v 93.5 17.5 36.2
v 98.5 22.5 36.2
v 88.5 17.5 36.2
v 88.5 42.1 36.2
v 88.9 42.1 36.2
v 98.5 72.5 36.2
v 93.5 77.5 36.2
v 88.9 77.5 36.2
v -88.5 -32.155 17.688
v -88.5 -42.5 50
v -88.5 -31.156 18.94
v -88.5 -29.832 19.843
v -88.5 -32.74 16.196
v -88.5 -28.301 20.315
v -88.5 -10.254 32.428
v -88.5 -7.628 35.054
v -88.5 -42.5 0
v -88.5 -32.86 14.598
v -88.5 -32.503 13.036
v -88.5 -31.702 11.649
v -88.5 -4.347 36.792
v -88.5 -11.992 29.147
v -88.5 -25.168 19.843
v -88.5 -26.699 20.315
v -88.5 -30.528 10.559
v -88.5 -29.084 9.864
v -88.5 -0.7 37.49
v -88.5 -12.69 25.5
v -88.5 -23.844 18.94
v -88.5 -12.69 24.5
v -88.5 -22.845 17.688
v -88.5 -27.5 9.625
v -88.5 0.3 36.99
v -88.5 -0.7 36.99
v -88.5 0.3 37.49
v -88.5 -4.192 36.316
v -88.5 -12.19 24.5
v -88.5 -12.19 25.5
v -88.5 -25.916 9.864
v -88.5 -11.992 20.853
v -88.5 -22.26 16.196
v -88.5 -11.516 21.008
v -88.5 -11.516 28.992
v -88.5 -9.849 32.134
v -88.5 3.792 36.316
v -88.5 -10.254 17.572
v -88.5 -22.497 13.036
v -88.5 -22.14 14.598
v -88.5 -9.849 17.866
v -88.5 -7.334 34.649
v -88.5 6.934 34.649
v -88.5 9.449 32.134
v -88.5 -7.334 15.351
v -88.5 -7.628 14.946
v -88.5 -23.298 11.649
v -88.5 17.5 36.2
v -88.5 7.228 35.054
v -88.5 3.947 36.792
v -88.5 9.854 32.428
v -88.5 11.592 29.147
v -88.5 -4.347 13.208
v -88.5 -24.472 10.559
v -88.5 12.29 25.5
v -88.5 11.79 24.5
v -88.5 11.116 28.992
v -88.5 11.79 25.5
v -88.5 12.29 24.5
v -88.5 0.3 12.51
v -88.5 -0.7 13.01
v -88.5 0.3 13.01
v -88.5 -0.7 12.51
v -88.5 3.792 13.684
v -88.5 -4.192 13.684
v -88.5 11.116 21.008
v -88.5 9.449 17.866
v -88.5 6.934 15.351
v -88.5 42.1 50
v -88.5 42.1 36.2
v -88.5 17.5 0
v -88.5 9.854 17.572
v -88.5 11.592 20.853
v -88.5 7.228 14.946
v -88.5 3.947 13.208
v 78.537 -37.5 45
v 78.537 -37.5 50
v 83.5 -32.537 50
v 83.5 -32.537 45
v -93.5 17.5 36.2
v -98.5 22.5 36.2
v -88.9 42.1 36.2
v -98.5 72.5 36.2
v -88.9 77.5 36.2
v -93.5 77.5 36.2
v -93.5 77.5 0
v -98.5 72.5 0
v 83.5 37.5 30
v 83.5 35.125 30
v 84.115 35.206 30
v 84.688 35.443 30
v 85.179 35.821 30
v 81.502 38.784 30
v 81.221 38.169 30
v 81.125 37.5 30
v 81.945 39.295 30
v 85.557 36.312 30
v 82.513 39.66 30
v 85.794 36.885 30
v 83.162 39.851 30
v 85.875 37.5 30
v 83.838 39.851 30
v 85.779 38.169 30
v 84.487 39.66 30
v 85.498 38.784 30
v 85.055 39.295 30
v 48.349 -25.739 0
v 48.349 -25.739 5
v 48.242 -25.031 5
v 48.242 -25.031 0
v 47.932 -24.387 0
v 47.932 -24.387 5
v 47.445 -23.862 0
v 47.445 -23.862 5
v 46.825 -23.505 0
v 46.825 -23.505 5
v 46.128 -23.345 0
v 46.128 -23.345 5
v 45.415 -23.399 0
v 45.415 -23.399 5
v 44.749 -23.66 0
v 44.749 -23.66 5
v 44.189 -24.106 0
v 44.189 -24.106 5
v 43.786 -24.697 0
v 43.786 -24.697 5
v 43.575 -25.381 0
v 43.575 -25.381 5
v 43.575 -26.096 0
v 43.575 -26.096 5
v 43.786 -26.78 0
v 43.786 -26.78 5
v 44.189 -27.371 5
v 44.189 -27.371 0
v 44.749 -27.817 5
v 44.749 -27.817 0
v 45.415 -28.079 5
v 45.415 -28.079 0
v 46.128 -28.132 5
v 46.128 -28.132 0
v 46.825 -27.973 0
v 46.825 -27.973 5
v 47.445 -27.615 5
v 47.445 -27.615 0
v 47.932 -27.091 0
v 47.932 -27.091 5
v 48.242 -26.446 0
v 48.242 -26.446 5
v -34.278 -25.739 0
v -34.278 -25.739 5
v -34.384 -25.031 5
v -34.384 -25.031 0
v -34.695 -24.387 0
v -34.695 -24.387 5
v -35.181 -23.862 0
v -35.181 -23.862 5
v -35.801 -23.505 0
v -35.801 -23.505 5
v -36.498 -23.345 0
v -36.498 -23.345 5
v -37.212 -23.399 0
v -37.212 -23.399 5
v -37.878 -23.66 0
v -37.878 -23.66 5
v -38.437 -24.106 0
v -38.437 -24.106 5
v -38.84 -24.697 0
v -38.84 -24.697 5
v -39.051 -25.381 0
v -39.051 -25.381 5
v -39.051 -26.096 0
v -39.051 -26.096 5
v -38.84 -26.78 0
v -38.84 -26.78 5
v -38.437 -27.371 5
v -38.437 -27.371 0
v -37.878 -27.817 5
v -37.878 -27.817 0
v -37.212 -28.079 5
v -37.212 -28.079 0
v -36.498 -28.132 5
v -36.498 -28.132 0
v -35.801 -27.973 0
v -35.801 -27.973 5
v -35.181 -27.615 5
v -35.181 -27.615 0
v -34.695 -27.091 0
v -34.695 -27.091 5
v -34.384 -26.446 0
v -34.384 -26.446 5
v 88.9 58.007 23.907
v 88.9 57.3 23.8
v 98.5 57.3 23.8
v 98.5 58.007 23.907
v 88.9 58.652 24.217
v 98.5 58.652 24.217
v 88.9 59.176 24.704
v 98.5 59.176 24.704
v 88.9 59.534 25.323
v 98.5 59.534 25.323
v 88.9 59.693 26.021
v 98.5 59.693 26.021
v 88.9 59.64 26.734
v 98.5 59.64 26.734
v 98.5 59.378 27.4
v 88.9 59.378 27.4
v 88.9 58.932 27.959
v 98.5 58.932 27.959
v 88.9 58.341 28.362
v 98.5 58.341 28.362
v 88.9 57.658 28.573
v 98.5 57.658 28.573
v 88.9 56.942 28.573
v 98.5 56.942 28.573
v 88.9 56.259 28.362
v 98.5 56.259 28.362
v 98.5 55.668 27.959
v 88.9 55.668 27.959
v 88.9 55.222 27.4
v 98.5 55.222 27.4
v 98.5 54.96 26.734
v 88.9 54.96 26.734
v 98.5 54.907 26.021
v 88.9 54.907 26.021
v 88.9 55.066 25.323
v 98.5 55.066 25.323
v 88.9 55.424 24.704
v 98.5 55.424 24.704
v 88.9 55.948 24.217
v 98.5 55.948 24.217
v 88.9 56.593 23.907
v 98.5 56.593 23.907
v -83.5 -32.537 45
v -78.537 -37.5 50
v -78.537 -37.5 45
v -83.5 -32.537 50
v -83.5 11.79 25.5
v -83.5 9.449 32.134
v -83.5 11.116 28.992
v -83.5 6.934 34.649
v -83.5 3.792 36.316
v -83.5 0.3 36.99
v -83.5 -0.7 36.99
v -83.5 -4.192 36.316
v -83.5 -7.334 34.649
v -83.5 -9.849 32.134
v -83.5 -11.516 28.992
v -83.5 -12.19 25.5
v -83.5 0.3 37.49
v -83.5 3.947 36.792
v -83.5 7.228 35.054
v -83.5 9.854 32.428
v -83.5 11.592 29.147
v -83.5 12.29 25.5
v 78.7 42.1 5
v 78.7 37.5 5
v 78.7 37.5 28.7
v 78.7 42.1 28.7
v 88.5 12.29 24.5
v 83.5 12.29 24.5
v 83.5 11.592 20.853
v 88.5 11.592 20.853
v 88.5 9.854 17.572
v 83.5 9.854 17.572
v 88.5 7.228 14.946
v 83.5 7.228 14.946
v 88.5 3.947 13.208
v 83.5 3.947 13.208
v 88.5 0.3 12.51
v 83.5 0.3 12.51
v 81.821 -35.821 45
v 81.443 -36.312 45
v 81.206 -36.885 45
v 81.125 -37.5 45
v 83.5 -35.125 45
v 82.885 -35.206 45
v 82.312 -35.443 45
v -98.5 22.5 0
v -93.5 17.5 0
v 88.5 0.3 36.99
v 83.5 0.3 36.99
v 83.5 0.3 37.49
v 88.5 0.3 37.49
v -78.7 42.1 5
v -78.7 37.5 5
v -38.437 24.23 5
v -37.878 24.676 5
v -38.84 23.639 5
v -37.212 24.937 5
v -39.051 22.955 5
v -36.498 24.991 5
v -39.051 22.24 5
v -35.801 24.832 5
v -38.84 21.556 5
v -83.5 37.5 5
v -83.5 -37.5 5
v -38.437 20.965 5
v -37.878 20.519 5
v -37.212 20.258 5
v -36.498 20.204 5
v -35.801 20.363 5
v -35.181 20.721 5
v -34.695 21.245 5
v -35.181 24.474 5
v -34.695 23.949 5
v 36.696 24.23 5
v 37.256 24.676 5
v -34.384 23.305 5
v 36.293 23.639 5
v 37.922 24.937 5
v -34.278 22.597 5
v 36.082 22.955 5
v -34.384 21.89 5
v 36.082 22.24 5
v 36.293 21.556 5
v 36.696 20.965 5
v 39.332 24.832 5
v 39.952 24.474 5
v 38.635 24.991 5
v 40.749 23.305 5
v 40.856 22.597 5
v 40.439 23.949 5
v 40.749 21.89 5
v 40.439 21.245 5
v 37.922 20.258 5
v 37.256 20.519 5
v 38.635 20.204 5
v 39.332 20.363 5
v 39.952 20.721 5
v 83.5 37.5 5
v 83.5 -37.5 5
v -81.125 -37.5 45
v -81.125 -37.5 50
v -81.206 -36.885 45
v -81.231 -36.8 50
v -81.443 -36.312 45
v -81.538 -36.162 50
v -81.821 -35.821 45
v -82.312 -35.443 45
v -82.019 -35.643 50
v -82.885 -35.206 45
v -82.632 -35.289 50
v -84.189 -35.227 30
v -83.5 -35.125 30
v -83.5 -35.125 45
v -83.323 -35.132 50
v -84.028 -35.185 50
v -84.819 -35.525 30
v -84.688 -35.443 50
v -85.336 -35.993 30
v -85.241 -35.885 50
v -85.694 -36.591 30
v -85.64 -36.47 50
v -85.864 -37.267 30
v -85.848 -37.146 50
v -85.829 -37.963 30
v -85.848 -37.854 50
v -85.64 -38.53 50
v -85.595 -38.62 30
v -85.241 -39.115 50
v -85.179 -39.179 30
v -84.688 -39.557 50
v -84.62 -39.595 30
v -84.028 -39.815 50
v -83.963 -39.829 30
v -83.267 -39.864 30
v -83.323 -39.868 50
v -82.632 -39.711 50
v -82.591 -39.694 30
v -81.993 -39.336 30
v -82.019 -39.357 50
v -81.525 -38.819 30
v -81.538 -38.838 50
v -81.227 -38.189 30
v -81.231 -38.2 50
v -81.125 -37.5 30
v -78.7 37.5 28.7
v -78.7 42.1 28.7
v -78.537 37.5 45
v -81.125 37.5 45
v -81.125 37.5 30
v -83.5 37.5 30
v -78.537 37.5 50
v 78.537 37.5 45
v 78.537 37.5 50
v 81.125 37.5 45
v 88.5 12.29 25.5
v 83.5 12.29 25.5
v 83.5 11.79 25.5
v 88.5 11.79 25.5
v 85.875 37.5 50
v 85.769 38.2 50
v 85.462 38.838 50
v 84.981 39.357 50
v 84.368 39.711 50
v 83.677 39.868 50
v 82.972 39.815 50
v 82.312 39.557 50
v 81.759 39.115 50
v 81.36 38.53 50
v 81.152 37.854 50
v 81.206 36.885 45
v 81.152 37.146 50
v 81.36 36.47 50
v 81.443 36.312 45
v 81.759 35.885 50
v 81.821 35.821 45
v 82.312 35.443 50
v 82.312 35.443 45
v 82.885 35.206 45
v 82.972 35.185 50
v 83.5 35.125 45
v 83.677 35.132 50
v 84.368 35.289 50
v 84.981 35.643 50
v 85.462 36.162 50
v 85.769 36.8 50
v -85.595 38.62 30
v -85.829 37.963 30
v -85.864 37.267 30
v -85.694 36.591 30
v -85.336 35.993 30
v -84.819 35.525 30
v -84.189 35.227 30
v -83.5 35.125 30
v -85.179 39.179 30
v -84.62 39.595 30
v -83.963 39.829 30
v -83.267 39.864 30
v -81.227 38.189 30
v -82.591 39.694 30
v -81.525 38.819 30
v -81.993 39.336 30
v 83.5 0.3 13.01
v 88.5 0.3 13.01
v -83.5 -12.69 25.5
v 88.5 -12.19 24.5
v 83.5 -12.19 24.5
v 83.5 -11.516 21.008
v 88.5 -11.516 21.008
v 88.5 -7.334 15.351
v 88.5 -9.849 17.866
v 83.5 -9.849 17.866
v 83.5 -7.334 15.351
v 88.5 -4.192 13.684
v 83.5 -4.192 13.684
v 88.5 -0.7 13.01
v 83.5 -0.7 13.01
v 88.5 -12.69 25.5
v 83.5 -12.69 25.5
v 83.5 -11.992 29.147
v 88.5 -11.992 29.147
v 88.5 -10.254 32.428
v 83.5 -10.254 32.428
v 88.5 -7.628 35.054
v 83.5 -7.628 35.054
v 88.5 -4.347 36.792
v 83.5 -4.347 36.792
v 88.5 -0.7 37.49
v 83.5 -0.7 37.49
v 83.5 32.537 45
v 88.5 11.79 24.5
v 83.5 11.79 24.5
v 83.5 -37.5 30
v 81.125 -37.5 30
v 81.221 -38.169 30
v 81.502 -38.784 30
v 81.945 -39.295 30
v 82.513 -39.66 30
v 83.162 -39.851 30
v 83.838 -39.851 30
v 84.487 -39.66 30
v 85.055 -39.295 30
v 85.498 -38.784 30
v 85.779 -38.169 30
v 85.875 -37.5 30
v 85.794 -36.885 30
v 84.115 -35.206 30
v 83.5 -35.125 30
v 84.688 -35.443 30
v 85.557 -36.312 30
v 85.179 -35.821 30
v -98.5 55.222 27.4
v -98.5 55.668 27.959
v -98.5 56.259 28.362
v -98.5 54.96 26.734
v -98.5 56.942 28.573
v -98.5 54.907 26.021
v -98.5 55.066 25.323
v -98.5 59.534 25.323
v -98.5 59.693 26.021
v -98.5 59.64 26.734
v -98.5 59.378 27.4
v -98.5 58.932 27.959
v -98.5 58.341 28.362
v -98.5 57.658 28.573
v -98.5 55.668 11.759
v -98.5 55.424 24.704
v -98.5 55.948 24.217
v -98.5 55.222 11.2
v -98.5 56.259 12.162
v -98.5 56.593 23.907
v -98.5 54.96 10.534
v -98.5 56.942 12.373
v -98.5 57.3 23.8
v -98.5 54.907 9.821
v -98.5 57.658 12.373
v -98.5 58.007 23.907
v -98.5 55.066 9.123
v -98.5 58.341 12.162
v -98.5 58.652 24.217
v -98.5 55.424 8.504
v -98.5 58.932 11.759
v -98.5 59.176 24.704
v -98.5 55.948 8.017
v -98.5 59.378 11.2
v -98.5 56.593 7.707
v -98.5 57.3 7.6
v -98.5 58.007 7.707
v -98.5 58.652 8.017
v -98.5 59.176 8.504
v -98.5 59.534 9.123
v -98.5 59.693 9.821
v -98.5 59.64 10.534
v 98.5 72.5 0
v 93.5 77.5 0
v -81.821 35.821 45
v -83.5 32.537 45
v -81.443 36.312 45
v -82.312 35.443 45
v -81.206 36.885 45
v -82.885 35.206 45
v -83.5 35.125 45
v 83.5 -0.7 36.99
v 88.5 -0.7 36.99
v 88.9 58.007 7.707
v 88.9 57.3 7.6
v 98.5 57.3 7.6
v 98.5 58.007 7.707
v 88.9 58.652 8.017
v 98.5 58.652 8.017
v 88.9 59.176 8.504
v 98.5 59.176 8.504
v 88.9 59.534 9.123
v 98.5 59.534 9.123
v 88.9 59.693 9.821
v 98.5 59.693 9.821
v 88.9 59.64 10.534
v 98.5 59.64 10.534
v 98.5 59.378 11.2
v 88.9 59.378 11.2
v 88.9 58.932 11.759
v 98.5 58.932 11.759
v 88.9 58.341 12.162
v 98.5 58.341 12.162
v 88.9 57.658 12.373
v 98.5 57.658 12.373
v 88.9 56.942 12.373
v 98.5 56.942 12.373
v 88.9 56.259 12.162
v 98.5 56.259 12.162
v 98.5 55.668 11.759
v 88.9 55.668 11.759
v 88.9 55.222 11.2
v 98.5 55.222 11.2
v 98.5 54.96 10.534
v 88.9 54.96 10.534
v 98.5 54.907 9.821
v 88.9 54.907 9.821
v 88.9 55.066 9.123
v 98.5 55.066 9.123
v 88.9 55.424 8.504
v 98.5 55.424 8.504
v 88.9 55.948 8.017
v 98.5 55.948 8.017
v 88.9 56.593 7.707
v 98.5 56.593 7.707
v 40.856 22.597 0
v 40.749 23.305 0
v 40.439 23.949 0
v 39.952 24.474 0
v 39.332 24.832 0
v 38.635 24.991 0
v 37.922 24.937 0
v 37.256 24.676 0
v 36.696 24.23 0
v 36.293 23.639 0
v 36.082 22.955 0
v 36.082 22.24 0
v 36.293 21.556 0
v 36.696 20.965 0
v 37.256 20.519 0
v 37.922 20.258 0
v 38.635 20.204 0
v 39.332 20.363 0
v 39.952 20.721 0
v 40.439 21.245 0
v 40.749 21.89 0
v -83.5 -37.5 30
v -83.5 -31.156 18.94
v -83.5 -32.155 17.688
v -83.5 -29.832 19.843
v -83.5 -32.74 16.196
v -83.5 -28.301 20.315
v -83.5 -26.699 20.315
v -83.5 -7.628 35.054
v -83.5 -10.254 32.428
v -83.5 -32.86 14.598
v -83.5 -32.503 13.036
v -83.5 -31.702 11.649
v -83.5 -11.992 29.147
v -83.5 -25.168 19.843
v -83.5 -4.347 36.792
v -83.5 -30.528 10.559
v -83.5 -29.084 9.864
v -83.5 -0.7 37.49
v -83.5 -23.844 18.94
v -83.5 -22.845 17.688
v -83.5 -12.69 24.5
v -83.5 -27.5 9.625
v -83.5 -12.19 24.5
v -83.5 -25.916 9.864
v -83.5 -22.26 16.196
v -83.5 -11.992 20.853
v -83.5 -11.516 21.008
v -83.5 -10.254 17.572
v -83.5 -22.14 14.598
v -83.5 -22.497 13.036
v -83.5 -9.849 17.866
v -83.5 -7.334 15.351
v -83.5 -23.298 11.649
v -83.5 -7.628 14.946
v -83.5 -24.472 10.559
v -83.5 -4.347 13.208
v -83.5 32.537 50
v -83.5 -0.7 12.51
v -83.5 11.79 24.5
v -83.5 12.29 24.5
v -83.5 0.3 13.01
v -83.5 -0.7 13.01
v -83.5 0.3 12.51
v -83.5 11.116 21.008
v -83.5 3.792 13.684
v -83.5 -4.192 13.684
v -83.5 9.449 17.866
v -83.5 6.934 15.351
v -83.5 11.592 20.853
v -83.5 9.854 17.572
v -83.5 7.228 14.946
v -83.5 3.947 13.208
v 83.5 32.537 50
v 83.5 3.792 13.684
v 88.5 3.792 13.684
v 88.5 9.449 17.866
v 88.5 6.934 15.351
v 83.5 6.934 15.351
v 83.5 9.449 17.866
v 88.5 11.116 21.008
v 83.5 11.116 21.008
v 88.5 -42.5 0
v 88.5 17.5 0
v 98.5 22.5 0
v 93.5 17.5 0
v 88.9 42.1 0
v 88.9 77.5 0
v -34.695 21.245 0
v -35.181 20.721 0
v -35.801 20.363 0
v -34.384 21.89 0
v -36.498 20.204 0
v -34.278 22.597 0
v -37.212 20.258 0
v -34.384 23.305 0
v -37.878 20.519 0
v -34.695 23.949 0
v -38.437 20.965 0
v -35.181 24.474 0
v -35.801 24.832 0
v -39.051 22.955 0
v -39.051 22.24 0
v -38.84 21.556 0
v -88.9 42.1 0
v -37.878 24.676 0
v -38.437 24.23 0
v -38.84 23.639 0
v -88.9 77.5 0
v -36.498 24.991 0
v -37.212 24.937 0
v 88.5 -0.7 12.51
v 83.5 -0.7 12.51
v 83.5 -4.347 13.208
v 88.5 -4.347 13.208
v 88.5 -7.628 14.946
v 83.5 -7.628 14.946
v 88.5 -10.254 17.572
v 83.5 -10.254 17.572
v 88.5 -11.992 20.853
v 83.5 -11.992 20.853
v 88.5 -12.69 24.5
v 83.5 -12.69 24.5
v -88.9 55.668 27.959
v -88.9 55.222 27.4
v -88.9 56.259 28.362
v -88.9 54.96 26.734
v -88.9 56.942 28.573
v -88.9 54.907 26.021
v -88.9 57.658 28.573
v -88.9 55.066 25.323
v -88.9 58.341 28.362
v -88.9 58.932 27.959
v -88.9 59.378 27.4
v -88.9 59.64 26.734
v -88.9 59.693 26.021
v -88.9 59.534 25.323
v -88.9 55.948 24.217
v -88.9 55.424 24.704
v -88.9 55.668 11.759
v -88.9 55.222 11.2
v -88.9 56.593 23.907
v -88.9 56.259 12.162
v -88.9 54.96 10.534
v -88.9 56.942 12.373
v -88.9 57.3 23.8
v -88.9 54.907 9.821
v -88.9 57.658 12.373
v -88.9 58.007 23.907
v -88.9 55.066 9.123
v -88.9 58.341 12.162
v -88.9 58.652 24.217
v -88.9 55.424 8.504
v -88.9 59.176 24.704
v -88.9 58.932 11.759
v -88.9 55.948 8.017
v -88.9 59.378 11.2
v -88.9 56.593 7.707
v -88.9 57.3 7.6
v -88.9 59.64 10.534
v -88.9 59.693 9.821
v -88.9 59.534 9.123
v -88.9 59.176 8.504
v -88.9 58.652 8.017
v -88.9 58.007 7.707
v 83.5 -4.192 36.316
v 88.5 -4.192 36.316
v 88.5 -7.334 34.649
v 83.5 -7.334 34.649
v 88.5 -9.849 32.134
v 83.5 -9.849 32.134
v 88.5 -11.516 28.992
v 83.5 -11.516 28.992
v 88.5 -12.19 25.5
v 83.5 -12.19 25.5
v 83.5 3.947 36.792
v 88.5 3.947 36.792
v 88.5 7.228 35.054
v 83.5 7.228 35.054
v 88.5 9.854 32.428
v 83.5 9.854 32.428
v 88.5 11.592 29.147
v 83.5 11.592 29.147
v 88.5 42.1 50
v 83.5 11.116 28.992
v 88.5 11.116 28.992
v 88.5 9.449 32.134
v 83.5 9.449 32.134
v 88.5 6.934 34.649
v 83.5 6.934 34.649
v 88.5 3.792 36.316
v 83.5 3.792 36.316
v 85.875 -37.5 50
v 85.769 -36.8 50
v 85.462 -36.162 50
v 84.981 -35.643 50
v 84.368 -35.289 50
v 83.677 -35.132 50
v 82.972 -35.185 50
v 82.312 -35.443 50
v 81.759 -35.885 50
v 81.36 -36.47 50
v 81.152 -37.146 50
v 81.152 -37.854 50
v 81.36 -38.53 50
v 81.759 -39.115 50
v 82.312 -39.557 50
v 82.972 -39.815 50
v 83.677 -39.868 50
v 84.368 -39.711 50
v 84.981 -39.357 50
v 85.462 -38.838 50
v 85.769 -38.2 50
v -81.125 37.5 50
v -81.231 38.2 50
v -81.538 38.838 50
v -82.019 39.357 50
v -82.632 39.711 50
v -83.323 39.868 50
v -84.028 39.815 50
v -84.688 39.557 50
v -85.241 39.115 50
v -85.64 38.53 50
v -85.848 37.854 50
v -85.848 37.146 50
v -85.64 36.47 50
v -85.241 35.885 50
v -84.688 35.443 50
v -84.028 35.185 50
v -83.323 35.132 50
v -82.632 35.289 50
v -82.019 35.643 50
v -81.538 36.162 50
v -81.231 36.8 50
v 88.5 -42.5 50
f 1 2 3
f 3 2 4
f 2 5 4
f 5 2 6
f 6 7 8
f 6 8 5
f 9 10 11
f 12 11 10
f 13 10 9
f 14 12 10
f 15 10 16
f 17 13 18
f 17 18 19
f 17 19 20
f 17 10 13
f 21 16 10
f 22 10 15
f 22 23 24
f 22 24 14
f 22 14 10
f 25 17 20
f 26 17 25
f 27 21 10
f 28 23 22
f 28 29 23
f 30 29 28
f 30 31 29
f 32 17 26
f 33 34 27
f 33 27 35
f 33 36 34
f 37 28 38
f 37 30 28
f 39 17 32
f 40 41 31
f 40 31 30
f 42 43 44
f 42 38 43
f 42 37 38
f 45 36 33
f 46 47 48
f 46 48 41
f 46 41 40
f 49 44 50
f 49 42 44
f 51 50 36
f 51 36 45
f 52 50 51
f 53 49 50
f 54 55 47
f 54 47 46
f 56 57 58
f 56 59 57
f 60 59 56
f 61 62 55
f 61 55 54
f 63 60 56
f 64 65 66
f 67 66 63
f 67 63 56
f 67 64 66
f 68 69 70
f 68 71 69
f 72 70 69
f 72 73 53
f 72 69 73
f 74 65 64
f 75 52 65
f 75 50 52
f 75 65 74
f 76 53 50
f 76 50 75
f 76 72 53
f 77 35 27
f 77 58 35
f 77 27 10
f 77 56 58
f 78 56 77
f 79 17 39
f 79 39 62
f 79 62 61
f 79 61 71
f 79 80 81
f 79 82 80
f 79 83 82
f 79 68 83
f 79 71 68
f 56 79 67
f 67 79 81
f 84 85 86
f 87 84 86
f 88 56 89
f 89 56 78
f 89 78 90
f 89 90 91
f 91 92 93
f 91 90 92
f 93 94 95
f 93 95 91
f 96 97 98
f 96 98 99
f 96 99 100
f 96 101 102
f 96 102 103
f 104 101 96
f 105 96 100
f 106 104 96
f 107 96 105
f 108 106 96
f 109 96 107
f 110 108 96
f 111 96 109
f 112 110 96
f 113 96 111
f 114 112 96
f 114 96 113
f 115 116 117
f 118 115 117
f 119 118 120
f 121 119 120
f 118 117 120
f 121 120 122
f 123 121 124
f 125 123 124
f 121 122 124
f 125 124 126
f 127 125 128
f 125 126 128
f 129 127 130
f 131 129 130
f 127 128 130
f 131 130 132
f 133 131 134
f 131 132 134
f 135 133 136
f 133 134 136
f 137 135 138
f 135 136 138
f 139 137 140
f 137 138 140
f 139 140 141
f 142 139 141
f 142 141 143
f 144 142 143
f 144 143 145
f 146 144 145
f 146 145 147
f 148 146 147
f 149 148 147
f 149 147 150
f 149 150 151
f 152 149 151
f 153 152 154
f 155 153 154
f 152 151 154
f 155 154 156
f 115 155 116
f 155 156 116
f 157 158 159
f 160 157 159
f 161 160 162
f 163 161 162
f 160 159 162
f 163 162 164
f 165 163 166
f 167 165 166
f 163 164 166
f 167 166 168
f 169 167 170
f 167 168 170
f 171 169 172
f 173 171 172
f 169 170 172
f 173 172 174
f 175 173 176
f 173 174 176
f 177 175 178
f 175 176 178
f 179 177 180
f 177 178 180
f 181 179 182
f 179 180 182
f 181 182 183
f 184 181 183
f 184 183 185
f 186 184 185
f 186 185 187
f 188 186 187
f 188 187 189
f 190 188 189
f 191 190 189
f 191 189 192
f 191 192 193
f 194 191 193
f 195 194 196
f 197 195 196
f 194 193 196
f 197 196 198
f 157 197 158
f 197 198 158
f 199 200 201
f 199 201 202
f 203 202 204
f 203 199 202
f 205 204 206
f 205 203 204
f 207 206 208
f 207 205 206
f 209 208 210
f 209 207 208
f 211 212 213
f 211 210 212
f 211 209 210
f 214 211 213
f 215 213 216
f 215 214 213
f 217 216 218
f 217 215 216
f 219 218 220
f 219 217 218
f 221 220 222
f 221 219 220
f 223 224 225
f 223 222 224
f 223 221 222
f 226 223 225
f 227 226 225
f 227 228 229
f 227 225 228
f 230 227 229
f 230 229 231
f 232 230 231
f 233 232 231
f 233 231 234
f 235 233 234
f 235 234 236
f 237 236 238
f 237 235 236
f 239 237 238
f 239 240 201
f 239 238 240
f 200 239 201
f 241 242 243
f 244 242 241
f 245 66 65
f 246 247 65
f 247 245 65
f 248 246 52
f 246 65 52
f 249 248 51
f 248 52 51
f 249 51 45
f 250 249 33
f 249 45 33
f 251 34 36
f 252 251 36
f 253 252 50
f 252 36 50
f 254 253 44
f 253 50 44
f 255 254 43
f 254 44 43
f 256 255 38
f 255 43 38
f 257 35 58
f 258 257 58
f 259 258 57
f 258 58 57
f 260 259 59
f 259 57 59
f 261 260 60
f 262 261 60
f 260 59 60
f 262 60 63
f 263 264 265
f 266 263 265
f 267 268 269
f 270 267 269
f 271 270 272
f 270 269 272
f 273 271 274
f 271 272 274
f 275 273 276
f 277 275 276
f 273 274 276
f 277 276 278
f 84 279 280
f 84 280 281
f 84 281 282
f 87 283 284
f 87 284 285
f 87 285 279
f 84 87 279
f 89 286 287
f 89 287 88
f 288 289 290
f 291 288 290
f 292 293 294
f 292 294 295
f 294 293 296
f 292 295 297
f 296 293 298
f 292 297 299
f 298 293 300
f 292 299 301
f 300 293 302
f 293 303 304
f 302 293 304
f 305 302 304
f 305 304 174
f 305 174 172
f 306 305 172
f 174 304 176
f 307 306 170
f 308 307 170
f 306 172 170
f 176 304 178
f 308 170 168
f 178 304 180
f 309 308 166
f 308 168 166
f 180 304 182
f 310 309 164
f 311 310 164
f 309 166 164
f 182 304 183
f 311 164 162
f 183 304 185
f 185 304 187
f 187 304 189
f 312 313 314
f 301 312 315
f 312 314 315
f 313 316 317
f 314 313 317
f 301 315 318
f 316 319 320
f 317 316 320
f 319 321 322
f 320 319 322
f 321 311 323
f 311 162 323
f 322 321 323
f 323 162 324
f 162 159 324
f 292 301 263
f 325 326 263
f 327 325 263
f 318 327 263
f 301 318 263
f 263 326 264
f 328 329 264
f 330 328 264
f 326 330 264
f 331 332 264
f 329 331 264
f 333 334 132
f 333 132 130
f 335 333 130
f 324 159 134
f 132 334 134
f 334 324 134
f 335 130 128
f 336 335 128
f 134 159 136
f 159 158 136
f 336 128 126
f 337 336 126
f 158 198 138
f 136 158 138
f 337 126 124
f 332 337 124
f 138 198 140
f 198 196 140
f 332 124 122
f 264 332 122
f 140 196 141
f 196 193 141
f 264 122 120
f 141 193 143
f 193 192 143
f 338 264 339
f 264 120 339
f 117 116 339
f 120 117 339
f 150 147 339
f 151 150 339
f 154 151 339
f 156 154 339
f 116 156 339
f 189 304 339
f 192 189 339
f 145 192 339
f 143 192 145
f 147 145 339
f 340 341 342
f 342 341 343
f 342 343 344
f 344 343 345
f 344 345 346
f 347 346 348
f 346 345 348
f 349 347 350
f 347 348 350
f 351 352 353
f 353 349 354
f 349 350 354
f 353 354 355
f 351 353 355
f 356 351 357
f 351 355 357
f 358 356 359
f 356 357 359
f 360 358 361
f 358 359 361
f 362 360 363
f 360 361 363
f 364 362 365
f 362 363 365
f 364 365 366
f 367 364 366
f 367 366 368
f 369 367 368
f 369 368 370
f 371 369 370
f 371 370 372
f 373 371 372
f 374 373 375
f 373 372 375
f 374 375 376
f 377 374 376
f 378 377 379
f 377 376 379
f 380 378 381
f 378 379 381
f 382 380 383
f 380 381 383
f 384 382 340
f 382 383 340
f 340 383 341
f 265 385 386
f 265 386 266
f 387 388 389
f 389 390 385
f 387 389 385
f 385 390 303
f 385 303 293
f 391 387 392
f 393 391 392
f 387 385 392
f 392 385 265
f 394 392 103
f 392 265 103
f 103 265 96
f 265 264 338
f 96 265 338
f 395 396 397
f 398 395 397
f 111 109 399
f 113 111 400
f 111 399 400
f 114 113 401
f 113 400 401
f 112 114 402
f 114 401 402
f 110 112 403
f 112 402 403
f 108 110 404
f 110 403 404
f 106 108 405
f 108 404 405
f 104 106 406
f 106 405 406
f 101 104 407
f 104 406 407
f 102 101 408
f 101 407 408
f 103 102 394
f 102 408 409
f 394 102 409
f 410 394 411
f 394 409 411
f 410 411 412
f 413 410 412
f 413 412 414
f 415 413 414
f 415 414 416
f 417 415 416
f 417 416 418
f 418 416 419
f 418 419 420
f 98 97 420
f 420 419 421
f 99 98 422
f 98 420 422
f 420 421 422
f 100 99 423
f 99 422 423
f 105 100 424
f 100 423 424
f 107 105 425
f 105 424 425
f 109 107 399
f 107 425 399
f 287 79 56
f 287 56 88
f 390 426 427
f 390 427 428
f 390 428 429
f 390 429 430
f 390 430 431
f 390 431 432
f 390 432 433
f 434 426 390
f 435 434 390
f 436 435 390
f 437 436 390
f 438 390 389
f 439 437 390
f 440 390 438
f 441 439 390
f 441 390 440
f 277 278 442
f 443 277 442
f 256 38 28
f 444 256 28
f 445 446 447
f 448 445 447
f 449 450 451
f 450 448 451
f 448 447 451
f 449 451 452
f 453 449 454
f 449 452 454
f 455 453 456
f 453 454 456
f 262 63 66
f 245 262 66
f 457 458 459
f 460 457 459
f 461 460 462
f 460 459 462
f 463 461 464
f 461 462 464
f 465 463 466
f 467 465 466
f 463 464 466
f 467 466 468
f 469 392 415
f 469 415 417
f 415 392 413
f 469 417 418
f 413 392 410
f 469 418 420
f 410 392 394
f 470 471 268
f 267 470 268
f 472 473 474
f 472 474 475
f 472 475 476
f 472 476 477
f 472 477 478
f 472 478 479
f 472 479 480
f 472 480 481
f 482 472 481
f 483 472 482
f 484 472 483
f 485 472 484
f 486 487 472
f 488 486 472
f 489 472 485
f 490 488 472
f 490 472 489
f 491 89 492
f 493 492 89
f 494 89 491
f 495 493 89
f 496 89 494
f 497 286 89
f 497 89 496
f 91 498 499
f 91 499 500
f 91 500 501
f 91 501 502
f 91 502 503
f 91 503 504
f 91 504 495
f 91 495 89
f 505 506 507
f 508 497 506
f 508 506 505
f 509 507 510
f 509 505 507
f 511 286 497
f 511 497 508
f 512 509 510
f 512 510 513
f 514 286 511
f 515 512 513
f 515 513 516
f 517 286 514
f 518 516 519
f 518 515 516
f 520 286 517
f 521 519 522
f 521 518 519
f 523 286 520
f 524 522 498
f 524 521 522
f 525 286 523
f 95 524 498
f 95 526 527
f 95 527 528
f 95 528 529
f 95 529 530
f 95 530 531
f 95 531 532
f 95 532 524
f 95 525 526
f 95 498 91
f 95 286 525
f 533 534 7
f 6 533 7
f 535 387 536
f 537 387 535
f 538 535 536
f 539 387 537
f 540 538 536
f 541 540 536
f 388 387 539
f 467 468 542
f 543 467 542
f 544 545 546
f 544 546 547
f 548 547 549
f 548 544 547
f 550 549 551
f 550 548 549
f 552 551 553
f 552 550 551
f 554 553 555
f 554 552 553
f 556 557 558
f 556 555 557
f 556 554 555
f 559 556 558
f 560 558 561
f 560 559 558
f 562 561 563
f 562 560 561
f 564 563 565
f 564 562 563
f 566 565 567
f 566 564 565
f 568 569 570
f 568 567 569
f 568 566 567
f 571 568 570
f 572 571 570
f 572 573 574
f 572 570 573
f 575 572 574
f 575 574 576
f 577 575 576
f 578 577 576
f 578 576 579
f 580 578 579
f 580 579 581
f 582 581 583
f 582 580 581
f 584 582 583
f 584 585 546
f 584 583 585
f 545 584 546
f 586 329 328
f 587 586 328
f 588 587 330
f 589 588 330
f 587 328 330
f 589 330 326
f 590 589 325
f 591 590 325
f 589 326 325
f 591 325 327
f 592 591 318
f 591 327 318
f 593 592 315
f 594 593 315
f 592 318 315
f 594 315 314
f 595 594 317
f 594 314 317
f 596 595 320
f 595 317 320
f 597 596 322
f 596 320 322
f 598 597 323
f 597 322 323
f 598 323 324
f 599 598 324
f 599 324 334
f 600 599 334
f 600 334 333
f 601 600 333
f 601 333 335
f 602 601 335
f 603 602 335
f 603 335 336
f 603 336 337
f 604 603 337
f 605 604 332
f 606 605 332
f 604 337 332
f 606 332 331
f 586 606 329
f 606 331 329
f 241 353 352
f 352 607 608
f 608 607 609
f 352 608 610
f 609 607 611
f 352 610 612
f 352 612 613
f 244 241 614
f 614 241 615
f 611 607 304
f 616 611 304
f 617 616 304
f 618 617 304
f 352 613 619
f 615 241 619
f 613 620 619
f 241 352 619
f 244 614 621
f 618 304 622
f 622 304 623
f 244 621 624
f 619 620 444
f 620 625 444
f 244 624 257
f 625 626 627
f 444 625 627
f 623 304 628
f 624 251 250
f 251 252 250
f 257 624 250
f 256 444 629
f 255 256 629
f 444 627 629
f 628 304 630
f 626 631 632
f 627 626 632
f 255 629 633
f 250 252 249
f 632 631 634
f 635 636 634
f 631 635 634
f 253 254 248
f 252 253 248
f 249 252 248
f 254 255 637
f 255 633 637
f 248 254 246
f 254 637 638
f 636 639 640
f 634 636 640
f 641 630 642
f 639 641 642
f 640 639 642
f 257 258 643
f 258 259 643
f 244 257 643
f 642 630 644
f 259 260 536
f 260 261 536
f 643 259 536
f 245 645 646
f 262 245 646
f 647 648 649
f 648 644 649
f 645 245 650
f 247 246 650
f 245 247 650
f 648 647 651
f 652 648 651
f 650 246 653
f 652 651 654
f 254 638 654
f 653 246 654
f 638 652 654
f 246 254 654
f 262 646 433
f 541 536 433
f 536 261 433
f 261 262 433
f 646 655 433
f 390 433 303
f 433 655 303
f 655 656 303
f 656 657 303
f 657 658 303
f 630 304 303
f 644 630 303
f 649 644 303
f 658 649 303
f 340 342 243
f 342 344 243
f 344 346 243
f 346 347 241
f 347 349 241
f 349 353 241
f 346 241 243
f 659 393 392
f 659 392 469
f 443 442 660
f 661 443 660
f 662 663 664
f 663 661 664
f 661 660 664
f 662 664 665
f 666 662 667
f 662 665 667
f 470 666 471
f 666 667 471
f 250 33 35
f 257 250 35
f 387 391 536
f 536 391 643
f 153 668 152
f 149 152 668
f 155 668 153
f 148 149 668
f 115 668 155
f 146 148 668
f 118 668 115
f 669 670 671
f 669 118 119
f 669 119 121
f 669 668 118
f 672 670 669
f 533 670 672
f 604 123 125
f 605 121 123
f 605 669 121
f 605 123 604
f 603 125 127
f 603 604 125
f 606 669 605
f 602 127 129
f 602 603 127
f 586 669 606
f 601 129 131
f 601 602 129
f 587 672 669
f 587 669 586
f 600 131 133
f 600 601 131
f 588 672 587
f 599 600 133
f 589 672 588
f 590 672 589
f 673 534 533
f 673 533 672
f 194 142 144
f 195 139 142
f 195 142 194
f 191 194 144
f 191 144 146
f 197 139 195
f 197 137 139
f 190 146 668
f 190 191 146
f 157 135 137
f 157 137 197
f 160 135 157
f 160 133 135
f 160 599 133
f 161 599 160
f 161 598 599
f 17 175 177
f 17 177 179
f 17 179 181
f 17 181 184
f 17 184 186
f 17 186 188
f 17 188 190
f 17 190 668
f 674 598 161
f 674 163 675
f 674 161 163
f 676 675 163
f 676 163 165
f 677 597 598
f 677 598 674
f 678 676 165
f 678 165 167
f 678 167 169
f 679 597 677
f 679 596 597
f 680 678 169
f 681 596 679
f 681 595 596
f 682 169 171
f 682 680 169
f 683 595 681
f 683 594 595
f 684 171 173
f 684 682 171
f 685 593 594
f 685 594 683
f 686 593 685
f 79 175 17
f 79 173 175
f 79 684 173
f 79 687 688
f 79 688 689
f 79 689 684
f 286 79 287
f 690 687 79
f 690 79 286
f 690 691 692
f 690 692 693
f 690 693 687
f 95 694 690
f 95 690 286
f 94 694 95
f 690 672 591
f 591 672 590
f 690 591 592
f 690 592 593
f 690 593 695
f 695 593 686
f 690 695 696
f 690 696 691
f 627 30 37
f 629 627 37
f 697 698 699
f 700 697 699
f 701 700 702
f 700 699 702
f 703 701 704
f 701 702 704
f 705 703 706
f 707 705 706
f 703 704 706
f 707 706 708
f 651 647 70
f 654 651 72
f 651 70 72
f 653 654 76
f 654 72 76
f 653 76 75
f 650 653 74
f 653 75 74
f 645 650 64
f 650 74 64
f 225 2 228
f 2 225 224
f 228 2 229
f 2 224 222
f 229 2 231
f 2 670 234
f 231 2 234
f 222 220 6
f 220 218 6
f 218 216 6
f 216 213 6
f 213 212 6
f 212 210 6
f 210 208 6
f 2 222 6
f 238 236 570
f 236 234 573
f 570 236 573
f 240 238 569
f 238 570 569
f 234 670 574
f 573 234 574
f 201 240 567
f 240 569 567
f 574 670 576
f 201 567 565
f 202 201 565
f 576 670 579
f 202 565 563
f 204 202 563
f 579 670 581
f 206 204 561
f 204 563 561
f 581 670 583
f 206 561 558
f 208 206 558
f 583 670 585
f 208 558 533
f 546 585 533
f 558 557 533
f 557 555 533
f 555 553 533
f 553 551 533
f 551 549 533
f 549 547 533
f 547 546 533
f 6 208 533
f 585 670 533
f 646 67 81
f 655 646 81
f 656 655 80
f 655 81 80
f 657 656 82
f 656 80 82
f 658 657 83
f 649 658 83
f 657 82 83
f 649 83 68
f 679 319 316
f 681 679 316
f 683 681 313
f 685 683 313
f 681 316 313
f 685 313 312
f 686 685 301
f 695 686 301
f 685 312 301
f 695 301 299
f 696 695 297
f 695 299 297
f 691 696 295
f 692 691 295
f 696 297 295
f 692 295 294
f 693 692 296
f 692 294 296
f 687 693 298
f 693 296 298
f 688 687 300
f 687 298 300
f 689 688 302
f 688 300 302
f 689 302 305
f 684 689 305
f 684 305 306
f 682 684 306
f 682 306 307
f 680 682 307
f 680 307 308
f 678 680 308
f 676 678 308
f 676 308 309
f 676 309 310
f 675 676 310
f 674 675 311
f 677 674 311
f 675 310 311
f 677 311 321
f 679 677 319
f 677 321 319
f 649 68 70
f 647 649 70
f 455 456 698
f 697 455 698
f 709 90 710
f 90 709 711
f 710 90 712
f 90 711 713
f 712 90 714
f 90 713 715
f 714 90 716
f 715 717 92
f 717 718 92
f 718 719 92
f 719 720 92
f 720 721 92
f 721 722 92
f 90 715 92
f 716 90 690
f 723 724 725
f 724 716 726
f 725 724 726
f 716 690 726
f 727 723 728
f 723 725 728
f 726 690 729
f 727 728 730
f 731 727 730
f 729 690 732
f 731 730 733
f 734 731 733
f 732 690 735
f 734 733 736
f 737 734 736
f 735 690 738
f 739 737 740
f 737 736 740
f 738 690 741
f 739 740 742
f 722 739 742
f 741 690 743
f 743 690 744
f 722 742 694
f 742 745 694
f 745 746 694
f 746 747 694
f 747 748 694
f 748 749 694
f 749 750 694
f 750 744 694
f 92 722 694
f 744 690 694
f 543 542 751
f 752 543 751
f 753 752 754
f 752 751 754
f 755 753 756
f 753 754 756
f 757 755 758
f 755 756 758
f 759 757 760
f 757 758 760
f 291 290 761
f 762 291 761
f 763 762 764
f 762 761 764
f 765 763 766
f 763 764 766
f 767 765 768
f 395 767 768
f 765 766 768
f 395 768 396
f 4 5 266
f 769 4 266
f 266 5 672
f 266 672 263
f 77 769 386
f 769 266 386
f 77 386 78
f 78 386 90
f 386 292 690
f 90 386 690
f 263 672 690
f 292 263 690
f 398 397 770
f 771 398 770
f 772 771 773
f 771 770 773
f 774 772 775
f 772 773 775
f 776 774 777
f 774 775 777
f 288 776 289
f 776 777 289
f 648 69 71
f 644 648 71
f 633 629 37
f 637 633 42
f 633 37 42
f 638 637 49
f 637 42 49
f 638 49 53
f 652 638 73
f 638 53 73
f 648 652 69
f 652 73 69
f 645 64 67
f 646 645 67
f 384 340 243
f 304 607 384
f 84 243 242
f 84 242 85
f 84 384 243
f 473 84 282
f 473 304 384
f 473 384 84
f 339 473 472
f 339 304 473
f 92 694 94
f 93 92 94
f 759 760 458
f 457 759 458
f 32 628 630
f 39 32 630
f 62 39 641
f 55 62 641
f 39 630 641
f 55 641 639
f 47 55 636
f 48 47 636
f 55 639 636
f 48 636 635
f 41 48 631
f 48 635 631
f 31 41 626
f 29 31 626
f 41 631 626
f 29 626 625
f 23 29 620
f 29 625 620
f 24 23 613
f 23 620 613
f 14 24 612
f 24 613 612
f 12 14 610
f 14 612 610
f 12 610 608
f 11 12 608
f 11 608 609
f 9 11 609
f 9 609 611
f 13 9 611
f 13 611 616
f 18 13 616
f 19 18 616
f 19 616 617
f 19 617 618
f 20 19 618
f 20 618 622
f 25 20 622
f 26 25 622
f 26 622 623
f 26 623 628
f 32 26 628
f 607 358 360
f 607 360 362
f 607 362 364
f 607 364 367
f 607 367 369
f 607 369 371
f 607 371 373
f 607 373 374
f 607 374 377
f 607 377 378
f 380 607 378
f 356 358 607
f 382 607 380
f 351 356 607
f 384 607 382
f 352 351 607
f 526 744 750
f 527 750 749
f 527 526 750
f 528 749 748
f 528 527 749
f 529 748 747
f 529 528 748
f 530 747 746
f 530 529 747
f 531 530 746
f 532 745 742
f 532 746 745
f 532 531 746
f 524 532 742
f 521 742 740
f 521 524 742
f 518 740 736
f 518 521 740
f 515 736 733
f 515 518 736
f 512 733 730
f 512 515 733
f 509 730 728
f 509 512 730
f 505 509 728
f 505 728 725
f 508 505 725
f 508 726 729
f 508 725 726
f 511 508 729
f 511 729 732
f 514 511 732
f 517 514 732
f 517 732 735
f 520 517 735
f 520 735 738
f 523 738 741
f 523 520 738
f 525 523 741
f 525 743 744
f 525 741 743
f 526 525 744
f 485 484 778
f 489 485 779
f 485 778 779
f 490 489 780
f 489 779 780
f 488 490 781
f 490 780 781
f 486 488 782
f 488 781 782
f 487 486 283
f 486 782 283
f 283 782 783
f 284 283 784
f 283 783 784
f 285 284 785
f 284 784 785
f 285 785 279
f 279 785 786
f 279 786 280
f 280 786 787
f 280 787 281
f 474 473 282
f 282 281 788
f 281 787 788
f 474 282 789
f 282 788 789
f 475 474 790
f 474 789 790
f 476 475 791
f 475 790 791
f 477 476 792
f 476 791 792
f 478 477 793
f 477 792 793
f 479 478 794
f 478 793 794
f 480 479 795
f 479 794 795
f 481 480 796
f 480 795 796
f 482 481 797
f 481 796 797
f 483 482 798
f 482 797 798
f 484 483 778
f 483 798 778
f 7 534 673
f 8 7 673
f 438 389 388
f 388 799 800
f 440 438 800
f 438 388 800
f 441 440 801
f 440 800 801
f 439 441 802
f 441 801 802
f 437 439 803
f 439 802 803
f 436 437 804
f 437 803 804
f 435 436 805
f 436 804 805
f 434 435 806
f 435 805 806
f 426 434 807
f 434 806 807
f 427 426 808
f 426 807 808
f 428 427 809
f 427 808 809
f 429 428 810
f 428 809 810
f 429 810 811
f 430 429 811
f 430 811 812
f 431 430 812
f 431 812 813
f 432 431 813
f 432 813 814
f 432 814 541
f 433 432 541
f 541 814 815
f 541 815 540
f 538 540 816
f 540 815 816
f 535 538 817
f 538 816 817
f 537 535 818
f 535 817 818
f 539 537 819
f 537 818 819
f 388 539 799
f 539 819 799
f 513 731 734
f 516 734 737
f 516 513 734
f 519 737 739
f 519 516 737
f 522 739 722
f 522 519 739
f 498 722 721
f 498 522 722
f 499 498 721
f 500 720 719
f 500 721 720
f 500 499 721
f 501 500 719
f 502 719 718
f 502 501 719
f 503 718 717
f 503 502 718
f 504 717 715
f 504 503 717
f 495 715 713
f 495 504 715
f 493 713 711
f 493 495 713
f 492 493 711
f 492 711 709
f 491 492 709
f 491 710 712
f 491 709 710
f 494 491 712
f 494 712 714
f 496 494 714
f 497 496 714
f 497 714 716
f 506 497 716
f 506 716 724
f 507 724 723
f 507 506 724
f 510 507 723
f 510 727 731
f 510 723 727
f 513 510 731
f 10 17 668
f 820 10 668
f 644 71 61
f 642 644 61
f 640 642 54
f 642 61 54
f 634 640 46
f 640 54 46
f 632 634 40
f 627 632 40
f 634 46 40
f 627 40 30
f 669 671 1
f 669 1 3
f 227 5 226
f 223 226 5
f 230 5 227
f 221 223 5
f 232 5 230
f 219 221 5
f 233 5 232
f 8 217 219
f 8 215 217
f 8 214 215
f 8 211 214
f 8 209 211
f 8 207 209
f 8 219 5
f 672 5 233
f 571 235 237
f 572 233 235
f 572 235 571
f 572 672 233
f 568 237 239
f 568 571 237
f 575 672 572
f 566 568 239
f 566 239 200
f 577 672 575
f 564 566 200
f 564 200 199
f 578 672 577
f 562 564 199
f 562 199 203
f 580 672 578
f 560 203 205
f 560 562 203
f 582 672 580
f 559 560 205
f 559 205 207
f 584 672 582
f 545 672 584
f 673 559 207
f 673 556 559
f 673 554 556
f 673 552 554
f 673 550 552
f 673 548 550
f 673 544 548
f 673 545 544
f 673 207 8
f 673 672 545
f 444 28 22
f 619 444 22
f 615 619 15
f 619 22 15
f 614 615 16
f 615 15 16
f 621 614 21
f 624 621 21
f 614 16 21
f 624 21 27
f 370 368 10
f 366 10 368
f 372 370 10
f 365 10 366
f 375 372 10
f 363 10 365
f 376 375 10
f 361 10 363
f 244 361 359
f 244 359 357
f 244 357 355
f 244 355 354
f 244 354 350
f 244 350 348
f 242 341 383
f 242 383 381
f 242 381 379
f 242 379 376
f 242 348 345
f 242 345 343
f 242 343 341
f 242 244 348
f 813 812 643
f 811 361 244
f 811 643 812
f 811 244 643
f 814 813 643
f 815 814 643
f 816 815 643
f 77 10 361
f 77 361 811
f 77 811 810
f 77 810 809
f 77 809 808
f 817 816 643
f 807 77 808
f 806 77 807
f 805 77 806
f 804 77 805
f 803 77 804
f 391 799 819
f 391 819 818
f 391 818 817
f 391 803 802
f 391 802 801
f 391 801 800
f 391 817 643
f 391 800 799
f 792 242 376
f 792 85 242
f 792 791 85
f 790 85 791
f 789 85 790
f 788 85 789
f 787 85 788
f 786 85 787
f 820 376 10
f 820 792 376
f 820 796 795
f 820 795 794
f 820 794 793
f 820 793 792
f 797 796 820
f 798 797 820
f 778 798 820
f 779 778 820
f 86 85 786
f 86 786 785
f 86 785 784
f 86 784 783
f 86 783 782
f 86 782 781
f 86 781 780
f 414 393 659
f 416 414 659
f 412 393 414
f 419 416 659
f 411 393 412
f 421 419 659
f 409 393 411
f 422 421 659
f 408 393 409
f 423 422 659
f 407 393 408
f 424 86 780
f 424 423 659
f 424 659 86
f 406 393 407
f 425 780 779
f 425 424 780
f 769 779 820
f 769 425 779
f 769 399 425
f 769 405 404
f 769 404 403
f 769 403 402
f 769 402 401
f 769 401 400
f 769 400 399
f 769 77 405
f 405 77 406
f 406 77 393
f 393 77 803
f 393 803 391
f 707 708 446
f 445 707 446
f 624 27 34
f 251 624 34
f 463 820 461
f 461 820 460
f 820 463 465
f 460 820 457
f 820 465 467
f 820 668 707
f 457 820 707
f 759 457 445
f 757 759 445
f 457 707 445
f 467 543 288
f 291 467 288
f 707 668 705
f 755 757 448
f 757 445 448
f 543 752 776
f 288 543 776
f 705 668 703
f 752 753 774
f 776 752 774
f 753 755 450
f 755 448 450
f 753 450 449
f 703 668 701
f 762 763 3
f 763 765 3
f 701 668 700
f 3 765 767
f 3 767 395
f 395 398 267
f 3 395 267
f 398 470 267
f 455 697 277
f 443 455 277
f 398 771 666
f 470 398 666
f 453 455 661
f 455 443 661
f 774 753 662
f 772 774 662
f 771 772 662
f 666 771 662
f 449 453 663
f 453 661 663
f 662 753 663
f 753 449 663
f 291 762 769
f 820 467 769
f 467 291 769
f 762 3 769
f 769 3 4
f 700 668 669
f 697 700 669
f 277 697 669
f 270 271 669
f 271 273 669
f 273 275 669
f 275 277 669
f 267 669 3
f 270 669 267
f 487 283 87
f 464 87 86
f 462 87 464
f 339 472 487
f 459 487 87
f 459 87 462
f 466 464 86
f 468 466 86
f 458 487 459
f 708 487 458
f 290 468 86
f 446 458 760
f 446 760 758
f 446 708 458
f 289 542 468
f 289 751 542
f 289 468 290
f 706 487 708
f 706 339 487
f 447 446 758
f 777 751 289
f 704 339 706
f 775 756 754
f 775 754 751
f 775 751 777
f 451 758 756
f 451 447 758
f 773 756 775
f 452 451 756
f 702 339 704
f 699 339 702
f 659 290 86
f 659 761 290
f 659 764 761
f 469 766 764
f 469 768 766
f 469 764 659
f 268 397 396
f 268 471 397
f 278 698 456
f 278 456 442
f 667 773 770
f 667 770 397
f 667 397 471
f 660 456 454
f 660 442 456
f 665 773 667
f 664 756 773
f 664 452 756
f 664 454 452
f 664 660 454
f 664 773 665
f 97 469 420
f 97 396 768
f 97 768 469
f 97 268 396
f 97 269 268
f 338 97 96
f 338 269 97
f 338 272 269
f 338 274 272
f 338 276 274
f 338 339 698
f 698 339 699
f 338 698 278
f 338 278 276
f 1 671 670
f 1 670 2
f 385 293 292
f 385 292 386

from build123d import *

# Parameters (mm, degrees)
SKETCH1_W           = 177
SKETCH1_H           = 85
BOSS_EXTRUDE1_DEPTH = 50
SHELL1_T            = -5
SKETCH2_W           = 157.4
SKETCH2_H           = 23.7
CUT_EXTRUDE1_DEPTH  = 6
SKETCH4_R           = 5.375
CUT_EXTRUDE2_DEPTH  = 6
SKETCH6_R           = 2.375
BOSS_EXTRUDE3_DEPTH = 5
SKETCH7_R           = 2.375
CUT_EXTRUDE4_DEPTH  = 20
SKETCH8_W           = 10
SKETCH8_H           = 60
BOSS_EXTRUDE4_DEPTH = 36.2
CHAMFER1_SIZE       = 5
SKETCH9_W           = 177.8
SKETCH9_H           = 35.8
SKETCH9_W_2         = 177
SKETCH9_H_2         = 35
CUT_EXTRUDE5_DEPTH  = 51
SKETCH10_R          = 2.4
CUT_EXTRUDE6_DEPTH  = 198
SKETCH11_R          = 2.4
CUT_EXTRUDE8_DEPTH  = 5
CUT_EXTRUDE14_DEPTH = 188


with BuildPart() as part:
    # Sketch1 → Boss-Extrude1 (new body)
    with BuildSketch(Plane.XY):
        Rectangle(SKETCH1_W, SKETCH1_H)
    extrude(amount=BOSS_EXTRUDE1_DEPTH)

    # Shell1
    shell1_openings = [part.faces().sort_by_distance(p)[0] for p in [
        (0, 0, 50),
    ]]
    offset(amount=SHELL1_T, openings=shell1_openings, kind=Kind.INTERSECTION)

    # Sketch2 → Cut-Extrude1 (cut, through all)
    with BuildSketch(Plane.XZ.offset(-37.5)):
        with Locations((0, 16.85)):
            Rectangle(SKETCH2_W, SKETCH2_H)
    extrude(amount=-CUT_EXTRUDE1_DEPTH, mode=Mode.SUBTRACT)

    # Sketch4 → Cut-Extrude2 (cut, through all)
    with BuildSketch(Plane(origin=(-83.5, 0, 0), x_dir=(0, 0, -1), z_dir=(1, 0, 0))):
        with Locations((-15, -27.5)):
            Circle(SKETCH4_R)
    extrude(amount=-CUT_EXTRUDE2_DEPTH, mode=Mode.SUBTRACT)

    # Sketch6 → Boss-Extrude3 (add)
    with BuildSketch(Plane.XY.offset(50)):
        Polygon((87.009300393, 41.009300393), (75.027799397, 41.009300393), (87.009300393, 29.027799397), align=None)
        with Locations((83.5, 37.5)):
            Circle(SKETCH6_R, mode=Mode.SUBTRACT)
        Polygon((75.027799397, -41.009300393), (87.009300393, -29.027799397), (87.009300393, -41.009300393), align=None)
        with Locations((83.5, -37.5)):
            Circle(SKETCH6_R, mode=Mode.SUBTRACT)
        Polygon((-87.009300393, -41.009300393), (-75.027799397, -41.009300393), (-87.009300393, -29.027799397), align=None)
        with Locations((-83.5, -37.5)):
            Circle(SKETCH6_R, mode=Mode.SUBTRACT)
        Polygon((-75.027799397, 41.009300393), (-87.009300393, 29.027799397), (-87.009300393, 41.009300393), align=None)
        with Locations((-83.5, 37.5)):
            Circle(SKETCH6_R, mode=Mode.SUBTRACT)
    extrude(amount=-BOSS_EXTRUDE3_DEPTH)

    # Sketch7 → Cut-Extrude4 (cut)
    with BuildSketch(Plane.XY.offset(50)):
        with Locations((83.5, 37.5)):
            Circle(SKETCH7_R)
        with Locations((83.5, -37.5)):
            Circle(SKETCH7_R)
        with Locations((-83.5, -37.5)):
            Circle(SKETCH7_R)
        with Locations((-83.5, 37.5)):
            Circle(SKETCH7_R)
    extrude(amount=-CUT_EXTRUDE4_DEPTH, mode=Mode.SUBTRACT)

    # Sketch8 → Boss-Extrude4 (add)
    with BuildSketch(Plane(origin=(0, 0, 0), x_dir=(-1, 0, 0), z_dir=(0, 0, -1))):
        with Locations((-93.5, 47.5)):
            Rectangle(SKETCH8_W, SKETCH8_H)
        with Locations((93.5, 47.5)):
            Rectangle(SKETCH8_W, SKETCH8_H)
    extrude(amount=-BOSS_EXTRUDE4_DEPTH)

    # Chamfer1
    chamfer1_edges = [part.edges().sort_by_distance(p)[0] for p in [
        (98.5, 17.5, 18.1),
        (98.5, 77.5, 18.1),
        (-98.5, 77.5, 18.1),
        (-98.5, 17.5, 18.1),
    ]]
    chamfer(chamfer1_edges, length=CHAMFER1_SIZE)

    # Sketch9 → Cut-Extrude5 (cut, through all)
    with BuildSketch(Plane(origin=(0, 0, 0), x_dir=(-1, 0, 0), z_dir=(0, 0, -1))):
        with Locations((0, 60)):
            Rectangle(SKETCH9_W, SKETCH9_H)
        with Locations((0, 60)):
            Rectangle(SKETCH9_W_2, SKETCH9_H_2, mode=Mode.SUBTRACT)
    extrude(amount=-CUT_EXTRUDE5_DEPTH, mode=Mode.SUBTRACT)

    # Sketch10 → Cut-Extrude6 (cut, through all)
    with BuildSketch(Plane(origin=(-98.5, 0, 0), x_dir=(0, 0, -1), z_dir=(1, 0, 0))):
        with Locations((-26.2, 57.3)):
            Circle(SKETCH10_R)
        with Locations((-10, 57.3)):
            Circle(SKETCH10_R)
    extrude(amount=CUT_EXTRUDE6_DEPTH, mode=Mode.SUBTRACT)

    # Sketch11 → Cut-Extrude8 (cut)
    with BuildSketch(Plane.XY.offset(5)):
        with Locations((45.9486, -25.738739303)):
            Circle(SKETCH11_R)
        with Locations((38.4556, 22.597460697)):
            Circle(SKETCH11_R)
        with Locations((-36.6776, 22.597460697)):
            Circle(SKETCH11_R)
        with Locations((-36.6776, -25.738739303)):
            Circle(SKETCH11_R)
    extrude(amount=-CUT_EXTRUDE8_DEPTH, mode=Mode.SUBTRACT)

    # Sketch12 → Cut-Extrude14 (cut, through all)
    with BuildSketch(Plane.ZY.offset(88.5)):
        with BuildLine():
            Line((24.5, 11.789578808), (24.5, 12.289995997))
            ThreePointArc((24.5, 12.289995997), (16.161165235, 8.638834765), (12.510004003, 0.3))
            Line((12.510004003, 0.3), (13.010421192, 0.3))
            ThreePointArc((13.010421192, 0.3), (16.514718626, 8.285281374), (24.5, 11.789578808))
        make_face()
        with BuildLine():
            Line((13.010421192, -0.7), (12.510004003, -0.7))
            ThreePointArc((12.510004003, -0.7), (16.161165235, -9.038834765), (24.5, -12.689995997))
            Line((24.5, -12.689995997), (24.5, -12.189578808))
            ThreePointArc((24.5, -12.189578808), (16.514718626, -8.685281374), (13.010421192, -0.7))
        make_face()
        with BuildLine():
            Line((37.489995997, -0.7), (36.989578808, -0.7))
            ThreePointArc((36.989578808, -0.7), (33.485281374, -8.685281374), (25.5, -12.189578808))
            Line((25.5, -12.189578808), (25.5, -12.689995997))
            ThreePointArc((25.5, -12.689995997), (33.838834765, -9.038834765), (37.489995997, -0.7))
        make_face()
        with BuildLine():
            ThreePointArc((37.489995997, 0.3), (33.838834765, 8.638834765), (25.5, 12.289995997))
            Line((25.5, 12.289995997), (25.5, 11.789578808))
            ThreePointArc((25.5, 11.789578808), (33.485281374, 8.285281374), (36.989578808, 0.3))
            Line((36.989578808, 0.3), (37.489995997, 0.3))
        make_face()
    extrude(amount=-CUT_EXTRUDE14_DEPTH, mode=Mode.SUBTRACT)


solid = part.part
